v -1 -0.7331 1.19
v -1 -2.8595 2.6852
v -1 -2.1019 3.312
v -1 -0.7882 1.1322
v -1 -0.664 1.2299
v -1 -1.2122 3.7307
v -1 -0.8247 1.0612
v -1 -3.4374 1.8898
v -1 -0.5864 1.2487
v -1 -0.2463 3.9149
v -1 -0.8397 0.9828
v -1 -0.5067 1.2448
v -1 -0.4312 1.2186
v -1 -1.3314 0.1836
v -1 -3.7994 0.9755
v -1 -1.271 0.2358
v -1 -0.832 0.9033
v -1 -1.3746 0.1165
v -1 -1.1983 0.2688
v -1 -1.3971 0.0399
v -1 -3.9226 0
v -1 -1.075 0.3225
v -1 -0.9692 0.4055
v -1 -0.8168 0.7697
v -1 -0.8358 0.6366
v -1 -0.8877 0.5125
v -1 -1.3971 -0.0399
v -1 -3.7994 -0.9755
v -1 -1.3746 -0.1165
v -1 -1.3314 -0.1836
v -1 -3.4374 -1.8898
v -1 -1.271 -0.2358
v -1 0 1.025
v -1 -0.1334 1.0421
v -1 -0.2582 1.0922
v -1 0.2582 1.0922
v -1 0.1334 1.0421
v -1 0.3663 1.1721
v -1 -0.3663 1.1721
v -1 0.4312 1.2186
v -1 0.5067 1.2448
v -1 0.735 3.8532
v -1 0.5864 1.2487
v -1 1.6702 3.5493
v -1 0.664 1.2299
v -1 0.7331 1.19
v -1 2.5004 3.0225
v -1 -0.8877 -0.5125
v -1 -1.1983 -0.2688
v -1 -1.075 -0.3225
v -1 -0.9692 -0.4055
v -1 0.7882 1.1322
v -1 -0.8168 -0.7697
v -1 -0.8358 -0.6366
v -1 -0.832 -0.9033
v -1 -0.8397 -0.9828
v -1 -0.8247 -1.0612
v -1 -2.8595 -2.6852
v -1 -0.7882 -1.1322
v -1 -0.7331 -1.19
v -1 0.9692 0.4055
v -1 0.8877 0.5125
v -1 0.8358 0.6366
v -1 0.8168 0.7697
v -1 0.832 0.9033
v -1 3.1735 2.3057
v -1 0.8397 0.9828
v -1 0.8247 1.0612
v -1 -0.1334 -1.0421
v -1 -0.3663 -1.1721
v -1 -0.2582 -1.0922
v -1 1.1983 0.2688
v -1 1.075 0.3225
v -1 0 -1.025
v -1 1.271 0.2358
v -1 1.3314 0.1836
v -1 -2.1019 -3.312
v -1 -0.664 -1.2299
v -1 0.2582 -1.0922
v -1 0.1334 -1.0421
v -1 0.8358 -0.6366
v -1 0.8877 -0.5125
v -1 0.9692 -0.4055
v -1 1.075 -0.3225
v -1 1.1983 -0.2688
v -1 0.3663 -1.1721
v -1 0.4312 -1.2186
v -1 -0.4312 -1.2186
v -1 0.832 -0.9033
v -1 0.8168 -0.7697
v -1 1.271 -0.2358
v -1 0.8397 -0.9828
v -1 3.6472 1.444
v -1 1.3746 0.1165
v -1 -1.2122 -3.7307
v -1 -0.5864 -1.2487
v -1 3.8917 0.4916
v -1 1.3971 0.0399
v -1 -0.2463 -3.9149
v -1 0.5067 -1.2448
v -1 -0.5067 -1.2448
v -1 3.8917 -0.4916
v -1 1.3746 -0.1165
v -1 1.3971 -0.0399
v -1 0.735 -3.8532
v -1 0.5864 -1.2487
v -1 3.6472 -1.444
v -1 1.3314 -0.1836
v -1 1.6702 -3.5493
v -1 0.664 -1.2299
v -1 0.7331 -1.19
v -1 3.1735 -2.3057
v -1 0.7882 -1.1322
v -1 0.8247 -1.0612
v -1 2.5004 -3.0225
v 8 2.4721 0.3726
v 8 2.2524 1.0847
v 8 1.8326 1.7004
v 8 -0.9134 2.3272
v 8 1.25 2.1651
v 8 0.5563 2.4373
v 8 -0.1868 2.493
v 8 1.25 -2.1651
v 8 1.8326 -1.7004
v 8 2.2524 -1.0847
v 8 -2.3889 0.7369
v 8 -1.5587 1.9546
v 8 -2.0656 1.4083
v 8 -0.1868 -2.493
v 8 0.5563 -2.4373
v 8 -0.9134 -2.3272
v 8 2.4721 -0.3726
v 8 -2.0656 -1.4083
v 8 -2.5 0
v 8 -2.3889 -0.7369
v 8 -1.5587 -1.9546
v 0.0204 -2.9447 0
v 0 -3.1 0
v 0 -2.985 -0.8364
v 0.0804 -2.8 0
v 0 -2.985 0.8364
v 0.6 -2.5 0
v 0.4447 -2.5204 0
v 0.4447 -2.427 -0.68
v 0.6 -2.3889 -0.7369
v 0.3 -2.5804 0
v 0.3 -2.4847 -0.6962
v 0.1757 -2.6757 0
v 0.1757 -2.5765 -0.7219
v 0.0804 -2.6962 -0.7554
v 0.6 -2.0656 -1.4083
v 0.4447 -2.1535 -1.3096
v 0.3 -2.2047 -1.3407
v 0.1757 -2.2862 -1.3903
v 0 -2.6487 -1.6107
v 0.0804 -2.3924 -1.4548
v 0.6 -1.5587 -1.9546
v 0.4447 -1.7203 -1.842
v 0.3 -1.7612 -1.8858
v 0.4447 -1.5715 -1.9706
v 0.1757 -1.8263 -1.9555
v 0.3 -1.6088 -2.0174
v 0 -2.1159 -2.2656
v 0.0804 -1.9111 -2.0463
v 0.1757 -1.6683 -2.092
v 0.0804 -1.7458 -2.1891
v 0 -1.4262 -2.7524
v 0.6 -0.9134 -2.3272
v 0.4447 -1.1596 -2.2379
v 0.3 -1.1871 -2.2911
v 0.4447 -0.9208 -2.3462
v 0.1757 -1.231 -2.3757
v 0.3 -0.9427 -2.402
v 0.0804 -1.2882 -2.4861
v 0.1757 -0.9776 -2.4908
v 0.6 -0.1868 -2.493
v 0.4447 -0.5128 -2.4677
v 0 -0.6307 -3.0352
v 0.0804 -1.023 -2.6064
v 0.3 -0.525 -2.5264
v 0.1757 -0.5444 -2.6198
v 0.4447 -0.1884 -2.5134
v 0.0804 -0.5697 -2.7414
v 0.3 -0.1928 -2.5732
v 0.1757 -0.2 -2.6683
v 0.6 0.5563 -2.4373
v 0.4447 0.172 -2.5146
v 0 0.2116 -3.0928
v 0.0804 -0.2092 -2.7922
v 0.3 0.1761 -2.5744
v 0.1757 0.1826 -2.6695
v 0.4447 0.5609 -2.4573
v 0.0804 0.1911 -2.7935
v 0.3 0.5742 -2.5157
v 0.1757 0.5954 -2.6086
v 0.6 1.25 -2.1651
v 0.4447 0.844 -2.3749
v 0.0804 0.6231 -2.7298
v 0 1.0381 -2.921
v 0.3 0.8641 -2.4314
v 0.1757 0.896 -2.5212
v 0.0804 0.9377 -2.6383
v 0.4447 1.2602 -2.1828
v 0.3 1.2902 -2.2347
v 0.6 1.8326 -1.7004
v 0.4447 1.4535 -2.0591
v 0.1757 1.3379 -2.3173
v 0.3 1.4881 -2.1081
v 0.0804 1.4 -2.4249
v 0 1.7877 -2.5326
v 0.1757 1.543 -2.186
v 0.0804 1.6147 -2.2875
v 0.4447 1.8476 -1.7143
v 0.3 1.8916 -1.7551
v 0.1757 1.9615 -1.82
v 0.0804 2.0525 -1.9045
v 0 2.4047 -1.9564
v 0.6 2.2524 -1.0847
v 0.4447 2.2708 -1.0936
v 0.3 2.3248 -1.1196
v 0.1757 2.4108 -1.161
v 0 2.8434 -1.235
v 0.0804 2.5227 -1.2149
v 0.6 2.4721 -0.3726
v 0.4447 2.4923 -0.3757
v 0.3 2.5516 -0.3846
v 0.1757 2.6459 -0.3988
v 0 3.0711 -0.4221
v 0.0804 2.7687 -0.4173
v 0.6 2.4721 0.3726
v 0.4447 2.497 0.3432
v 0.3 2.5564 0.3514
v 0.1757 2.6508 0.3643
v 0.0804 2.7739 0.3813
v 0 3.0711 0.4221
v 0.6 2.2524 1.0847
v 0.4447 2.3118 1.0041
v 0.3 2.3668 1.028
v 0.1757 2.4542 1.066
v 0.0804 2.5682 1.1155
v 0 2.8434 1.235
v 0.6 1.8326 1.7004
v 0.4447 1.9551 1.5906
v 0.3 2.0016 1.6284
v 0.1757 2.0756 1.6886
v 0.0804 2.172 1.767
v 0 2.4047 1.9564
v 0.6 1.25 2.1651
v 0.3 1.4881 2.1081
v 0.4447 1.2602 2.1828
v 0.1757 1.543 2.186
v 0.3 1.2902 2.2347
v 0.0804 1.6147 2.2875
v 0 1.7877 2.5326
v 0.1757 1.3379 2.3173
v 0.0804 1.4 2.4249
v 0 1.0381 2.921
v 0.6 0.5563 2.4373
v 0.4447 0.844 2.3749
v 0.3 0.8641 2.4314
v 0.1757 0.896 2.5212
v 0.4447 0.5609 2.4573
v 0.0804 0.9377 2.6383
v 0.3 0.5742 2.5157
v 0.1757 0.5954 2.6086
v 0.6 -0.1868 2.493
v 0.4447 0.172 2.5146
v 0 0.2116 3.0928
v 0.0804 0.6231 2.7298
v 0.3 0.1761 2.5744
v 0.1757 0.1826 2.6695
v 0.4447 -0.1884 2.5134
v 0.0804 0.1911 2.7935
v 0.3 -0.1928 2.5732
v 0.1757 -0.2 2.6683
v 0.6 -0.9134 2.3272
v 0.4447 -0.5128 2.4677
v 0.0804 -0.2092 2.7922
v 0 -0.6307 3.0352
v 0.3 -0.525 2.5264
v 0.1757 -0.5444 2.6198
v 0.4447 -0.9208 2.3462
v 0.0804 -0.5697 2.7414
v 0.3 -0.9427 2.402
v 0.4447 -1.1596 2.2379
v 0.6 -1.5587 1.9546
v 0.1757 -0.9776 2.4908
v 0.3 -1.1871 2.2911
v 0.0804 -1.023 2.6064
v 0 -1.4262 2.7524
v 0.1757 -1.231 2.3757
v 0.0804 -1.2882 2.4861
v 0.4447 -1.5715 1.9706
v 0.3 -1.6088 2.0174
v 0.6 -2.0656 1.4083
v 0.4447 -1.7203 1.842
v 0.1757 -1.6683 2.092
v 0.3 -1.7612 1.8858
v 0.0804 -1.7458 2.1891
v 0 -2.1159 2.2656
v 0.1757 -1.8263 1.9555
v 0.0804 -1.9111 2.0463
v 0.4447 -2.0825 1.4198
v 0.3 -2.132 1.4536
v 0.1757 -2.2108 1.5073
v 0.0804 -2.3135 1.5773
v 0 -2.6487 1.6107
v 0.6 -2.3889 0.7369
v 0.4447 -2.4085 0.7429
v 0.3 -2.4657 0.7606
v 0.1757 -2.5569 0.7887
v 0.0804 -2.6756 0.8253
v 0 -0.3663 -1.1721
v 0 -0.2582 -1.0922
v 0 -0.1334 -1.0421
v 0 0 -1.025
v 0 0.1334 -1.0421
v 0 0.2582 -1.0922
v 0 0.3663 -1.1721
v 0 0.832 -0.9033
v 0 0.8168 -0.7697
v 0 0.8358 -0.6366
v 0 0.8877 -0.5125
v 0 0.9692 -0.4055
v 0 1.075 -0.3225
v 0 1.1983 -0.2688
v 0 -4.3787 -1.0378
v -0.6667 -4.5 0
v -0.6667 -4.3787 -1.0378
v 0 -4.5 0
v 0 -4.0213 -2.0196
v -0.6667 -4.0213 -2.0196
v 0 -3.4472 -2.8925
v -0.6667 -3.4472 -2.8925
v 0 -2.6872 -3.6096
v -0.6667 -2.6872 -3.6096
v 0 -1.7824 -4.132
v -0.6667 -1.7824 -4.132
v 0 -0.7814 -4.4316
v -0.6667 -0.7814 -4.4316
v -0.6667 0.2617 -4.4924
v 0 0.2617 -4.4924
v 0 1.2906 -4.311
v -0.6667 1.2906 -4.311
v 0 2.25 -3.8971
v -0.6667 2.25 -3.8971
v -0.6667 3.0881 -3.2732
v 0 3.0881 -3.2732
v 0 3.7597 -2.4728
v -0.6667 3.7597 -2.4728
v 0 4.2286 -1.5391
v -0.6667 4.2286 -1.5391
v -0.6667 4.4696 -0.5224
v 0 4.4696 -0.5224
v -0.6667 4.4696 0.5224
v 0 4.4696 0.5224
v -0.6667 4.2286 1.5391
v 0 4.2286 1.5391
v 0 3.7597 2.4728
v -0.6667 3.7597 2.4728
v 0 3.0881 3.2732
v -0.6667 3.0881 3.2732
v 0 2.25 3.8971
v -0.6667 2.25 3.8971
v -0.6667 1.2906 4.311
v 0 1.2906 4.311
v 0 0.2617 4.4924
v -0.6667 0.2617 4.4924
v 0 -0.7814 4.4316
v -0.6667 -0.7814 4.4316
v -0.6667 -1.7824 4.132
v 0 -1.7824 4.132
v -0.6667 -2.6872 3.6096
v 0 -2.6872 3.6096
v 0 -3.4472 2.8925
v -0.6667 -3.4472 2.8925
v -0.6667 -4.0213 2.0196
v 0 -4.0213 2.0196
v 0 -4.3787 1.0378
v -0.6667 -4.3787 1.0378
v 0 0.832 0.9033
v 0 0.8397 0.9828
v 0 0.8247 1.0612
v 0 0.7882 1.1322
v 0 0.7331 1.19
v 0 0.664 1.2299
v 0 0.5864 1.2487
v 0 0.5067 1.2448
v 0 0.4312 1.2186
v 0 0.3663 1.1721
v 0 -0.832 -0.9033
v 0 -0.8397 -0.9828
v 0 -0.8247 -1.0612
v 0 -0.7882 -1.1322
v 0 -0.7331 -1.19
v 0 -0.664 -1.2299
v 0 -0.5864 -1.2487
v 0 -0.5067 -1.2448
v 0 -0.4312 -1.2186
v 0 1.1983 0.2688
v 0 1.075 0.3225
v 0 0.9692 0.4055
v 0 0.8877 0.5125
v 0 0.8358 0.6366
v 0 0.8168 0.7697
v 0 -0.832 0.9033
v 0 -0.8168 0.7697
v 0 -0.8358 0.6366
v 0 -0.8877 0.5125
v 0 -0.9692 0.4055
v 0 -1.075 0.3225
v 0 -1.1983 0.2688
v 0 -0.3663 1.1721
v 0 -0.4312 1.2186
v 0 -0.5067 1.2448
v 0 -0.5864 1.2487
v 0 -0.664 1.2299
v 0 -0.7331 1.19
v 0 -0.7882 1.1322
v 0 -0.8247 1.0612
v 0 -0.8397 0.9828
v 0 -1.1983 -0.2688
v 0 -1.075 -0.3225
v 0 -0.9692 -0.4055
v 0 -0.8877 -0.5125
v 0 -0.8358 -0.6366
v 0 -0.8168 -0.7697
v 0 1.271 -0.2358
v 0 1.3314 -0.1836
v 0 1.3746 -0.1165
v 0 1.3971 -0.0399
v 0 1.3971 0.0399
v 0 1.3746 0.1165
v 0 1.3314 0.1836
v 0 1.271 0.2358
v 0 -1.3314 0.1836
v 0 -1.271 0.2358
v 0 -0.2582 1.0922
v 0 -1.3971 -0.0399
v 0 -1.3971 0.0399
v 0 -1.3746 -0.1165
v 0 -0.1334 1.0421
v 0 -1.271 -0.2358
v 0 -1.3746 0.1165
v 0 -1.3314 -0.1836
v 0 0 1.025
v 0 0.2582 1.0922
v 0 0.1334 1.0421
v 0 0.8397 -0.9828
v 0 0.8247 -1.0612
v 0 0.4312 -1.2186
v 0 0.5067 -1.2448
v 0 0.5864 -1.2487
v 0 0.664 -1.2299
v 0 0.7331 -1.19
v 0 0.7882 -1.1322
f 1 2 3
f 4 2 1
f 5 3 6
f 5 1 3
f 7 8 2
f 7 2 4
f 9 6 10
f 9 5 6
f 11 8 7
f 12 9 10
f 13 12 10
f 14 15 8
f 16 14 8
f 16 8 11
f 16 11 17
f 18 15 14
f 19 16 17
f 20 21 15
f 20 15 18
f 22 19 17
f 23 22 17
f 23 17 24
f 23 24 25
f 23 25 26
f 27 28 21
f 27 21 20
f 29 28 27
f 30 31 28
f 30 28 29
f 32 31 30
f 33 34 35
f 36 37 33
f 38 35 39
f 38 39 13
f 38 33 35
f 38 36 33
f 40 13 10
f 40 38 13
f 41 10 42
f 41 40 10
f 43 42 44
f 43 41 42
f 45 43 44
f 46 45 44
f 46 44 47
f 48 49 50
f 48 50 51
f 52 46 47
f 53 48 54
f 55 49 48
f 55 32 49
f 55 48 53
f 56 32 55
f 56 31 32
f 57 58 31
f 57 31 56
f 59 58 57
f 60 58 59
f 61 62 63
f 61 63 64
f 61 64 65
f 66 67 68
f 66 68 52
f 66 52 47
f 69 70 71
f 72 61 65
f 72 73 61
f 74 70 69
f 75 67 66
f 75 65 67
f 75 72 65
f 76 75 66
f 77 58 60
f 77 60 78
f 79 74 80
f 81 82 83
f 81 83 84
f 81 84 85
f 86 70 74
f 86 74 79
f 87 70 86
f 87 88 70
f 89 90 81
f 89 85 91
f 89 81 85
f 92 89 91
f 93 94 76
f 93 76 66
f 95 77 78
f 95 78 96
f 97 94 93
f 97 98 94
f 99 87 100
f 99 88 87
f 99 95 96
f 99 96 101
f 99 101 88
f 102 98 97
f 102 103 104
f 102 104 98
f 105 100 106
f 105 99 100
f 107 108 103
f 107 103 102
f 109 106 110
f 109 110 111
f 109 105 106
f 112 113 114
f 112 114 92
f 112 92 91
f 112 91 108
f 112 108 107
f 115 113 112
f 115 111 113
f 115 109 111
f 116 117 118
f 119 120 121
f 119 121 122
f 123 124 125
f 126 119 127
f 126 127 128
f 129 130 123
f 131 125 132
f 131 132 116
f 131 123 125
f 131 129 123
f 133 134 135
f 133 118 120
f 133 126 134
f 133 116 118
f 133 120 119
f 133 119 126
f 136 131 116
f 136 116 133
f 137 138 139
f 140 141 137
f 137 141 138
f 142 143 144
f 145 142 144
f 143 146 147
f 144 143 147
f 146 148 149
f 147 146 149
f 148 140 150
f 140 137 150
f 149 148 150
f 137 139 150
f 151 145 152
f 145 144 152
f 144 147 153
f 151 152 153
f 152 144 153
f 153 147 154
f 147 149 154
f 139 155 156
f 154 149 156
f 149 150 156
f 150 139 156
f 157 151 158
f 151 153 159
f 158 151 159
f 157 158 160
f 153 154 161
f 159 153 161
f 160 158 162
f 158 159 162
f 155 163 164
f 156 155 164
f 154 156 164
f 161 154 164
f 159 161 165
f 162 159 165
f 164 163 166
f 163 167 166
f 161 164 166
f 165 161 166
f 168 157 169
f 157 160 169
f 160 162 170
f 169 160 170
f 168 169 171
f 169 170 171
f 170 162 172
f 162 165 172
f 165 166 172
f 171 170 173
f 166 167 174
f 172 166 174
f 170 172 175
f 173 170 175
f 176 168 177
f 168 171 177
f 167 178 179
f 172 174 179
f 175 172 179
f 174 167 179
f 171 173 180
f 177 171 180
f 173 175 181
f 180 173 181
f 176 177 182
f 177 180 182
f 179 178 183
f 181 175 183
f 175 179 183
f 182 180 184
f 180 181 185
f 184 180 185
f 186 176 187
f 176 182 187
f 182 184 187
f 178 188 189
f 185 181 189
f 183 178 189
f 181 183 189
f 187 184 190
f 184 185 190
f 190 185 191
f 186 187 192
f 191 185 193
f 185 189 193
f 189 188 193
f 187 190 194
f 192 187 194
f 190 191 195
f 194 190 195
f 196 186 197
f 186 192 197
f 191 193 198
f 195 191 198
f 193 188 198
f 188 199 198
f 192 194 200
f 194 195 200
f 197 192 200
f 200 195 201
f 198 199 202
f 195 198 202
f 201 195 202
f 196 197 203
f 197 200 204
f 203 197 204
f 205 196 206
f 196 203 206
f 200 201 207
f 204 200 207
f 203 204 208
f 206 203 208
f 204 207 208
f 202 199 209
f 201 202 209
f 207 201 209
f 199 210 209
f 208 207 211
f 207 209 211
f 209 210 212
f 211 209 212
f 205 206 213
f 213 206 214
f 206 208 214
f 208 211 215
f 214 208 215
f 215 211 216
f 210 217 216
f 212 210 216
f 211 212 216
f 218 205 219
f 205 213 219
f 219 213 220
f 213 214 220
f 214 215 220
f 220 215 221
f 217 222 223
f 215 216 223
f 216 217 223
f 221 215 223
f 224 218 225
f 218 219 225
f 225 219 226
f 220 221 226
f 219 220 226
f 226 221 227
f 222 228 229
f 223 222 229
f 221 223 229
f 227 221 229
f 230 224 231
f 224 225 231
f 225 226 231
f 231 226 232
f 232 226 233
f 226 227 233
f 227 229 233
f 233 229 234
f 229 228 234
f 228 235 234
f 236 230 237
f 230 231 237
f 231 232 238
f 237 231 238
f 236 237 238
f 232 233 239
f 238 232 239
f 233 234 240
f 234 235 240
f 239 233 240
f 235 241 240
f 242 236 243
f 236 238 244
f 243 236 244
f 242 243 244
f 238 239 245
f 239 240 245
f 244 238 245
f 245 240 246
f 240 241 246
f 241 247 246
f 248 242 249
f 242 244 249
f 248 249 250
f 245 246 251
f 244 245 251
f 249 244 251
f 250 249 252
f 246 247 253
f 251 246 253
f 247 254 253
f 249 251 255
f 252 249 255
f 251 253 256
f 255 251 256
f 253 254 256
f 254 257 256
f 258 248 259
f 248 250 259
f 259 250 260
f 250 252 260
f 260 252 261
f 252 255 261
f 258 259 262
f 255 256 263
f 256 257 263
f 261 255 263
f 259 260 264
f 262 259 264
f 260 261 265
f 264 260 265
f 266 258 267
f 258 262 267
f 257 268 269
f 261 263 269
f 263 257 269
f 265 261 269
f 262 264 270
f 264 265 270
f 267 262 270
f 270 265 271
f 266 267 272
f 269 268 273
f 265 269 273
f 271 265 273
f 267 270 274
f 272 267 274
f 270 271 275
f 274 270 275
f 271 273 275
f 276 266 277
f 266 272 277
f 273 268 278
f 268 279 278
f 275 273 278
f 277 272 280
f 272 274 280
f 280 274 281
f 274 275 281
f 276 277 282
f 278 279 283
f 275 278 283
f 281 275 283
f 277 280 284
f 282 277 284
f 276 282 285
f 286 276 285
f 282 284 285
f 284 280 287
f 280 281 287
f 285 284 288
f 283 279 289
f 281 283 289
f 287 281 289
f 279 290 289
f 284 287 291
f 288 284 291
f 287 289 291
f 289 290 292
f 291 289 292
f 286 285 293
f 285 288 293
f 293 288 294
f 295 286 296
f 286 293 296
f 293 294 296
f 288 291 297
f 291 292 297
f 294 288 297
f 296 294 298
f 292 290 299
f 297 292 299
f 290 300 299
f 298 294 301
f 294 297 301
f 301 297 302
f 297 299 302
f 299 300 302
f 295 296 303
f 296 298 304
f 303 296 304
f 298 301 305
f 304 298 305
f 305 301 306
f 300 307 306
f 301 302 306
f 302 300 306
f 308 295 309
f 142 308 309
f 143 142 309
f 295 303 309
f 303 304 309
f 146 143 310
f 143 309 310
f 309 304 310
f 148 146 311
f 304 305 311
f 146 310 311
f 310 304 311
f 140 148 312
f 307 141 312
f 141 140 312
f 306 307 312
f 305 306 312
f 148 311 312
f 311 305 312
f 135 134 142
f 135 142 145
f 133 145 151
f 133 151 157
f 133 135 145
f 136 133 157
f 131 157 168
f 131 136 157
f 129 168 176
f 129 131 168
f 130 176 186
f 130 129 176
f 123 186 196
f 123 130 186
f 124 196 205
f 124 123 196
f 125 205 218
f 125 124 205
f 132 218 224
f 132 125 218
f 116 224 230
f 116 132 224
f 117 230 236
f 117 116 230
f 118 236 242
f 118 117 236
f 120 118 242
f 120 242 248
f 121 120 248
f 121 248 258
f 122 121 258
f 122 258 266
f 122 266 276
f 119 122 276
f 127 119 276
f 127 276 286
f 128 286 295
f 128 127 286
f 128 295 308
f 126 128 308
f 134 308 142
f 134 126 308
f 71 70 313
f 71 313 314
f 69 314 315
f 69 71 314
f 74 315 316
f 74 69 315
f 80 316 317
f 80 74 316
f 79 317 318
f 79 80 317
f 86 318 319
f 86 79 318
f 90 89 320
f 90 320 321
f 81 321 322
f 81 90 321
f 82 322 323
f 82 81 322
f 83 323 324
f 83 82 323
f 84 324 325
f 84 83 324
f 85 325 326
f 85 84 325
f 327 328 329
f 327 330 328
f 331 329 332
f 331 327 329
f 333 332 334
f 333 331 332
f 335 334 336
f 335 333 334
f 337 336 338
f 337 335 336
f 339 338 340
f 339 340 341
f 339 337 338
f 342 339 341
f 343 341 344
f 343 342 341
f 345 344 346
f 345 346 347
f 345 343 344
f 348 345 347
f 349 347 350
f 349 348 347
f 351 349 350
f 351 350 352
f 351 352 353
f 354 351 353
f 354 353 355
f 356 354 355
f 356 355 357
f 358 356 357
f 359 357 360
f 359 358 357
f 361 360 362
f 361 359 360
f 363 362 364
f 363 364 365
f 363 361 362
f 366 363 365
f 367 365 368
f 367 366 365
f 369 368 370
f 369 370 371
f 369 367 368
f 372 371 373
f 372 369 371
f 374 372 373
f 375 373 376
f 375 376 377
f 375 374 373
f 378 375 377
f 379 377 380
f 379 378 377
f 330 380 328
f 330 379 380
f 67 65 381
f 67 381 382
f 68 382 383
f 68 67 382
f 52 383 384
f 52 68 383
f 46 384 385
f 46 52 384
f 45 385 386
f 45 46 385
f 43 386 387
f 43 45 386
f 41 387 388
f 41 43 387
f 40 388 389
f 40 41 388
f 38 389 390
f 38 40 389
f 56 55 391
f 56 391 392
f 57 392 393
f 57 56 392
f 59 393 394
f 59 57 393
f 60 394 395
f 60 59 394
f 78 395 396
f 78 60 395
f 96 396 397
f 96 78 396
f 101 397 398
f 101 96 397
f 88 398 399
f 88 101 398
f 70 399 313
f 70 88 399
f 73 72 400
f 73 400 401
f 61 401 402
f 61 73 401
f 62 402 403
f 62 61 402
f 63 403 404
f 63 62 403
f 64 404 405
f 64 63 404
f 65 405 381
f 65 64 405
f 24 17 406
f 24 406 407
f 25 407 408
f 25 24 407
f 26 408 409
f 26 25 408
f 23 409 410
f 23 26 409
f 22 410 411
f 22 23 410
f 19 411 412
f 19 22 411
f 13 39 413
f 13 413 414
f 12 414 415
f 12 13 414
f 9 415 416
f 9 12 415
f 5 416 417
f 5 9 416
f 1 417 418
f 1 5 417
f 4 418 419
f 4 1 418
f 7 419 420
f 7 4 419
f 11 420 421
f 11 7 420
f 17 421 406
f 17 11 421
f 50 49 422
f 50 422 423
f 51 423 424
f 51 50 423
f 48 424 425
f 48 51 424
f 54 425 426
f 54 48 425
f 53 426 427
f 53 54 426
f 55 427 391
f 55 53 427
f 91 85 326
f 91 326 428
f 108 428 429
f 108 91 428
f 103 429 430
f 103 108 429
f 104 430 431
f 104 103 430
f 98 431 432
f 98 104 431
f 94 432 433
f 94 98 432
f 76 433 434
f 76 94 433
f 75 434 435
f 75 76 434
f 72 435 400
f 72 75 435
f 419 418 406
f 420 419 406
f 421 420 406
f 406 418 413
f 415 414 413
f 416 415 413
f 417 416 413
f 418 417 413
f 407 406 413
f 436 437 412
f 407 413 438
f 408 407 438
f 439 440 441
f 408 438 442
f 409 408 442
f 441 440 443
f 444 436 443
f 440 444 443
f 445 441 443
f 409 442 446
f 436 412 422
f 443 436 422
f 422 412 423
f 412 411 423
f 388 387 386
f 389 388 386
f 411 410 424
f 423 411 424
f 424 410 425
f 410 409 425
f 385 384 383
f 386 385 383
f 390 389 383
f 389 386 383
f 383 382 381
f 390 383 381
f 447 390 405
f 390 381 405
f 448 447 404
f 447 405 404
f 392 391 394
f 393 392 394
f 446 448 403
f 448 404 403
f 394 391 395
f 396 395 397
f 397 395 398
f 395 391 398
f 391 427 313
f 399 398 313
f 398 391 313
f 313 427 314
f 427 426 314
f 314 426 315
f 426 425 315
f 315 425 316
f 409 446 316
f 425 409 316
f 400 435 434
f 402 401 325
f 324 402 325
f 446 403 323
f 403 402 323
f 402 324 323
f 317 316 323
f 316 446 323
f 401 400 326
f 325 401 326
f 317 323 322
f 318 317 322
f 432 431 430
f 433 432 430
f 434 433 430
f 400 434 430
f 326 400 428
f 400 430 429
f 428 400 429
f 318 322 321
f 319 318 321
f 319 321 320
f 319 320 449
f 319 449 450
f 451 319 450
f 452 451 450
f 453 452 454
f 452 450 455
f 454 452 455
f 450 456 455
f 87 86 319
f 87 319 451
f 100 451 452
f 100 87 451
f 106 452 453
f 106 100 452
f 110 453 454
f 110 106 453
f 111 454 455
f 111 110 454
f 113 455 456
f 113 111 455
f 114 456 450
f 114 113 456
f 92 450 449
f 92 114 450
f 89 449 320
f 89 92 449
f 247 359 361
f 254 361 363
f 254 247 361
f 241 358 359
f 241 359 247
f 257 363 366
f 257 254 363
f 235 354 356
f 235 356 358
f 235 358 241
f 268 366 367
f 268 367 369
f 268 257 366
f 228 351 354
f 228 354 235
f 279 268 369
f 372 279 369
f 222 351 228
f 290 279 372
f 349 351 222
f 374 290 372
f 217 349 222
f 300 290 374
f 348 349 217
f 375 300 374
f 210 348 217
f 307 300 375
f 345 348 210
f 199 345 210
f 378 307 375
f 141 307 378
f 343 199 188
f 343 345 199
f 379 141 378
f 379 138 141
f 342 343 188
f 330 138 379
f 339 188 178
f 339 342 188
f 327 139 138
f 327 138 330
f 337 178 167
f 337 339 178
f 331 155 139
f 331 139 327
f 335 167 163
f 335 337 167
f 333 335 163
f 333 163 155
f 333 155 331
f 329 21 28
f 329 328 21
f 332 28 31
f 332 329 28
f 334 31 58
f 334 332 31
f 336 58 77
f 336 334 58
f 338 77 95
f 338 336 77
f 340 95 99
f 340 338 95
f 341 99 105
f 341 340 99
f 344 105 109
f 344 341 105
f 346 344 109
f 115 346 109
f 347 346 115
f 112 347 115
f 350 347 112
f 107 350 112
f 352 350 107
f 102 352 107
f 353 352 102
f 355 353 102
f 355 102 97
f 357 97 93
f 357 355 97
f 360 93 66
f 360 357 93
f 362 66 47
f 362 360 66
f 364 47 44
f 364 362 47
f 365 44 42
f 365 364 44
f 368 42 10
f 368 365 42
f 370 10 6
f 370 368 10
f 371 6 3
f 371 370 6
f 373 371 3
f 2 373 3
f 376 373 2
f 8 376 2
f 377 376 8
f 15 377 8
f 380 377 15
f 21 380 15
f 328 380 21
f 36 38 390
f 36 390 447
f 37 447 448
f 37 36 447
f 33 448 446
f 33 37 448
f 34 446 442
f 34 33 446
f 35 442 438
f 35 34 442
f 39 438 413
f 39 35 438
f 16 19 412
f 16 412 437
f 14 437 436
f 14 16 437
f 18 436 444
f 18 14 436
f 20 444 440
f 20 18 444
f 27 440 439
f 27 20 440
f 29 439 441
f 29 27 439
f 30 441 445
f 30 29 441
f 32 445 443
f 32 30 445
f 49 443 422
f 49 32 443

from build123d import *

# Parameters (mm, degrees)
CUT_EXTRUDE1_DEPTH = 1
FILLET1_R          = 0.6


with BuildPart() as part:
    # Sketch1 → Revolve1 (revolve)
    with BuildSketch(Plane.XY):
        Polygon((0, 2.5), (8, 2.5), (8, 0), (-1, 0), (-1, 3.922649731), (-0.666666667, 4.5), (0, 4.5), align=None)
    revolve(axis=Axis((-1, 0, 0), (1, 0, 0)))

    # Sketch2 → Cut-Extrude1 (cut)
    with BuildSketch(Plane(origin=(-1, 0, 0), x_dir=(0, 0, -1), z_dir=(1, 0, 0))):
        with BuildLine():
            ThreePointArc((0.268841336, 1.198258139), (0, 1.4), (-0.268841336, 1.198258139))
            ThreePointArc((-0.268841336, 1.198258139), (-0.5125, 0.887676039), (-0.903301321, 0.831952496))
            ThreePointArc((-0.903301321, 0.831952496), (-1.212435565, 0.7), (-1.172142656, 0.366305643))
            ThreePointArc((-1.172142656, 0.366305643), (-1.025, 0), (-1.172142656, -0.366305643))
            ThreePointArc((-1.172142656, -0.366305643), (-1.212435565, -0.7), (-0.903301321, -0.831952496))
            ThreePointArc((-0.903301321, -0.831952496), (-0.5125, -0.887676039), (-0.268841336, -1.198258139))
            ThreePointArc((-0.268841336, -1.198258139), (0, -1.4), (0.268841336, -1.198258139))
            ThreePointArc((0.268841336, -1.198258139), (0.5125, -0.887676039), (0.903301321, -0.831952496))
            ThreePointArc((0.903301321, -0.831952496), (1.212435565, -0.7), (1.172142656, -0.366305643))
            ThreePointArc((1.172142656, -0.366305643), (1.025, 0), (1.172142656, 0.366305643))
            ThreePointArc((1.172142656, 0.366305643), (1.212435565, 0.7), (0.903301321, 0.831952496))
            ThreePointArc((0.903301321, 0.831952496), (0.5125, 0.887676039), (0.268841336, 1.198258139))
        make_face()
    extrude(amount=CUT_EXTRUDE1_DEPTH, mode=Mode.SUBTRACT)

    # Fillet1
    fillet1_edges = [part.edges().sort_by_distance(p)[0] for p in [
        (0, -2.5, 0),
    ]]
    fillet(fillet1_edges, radius=FILLET1_R)


solid = part.part
